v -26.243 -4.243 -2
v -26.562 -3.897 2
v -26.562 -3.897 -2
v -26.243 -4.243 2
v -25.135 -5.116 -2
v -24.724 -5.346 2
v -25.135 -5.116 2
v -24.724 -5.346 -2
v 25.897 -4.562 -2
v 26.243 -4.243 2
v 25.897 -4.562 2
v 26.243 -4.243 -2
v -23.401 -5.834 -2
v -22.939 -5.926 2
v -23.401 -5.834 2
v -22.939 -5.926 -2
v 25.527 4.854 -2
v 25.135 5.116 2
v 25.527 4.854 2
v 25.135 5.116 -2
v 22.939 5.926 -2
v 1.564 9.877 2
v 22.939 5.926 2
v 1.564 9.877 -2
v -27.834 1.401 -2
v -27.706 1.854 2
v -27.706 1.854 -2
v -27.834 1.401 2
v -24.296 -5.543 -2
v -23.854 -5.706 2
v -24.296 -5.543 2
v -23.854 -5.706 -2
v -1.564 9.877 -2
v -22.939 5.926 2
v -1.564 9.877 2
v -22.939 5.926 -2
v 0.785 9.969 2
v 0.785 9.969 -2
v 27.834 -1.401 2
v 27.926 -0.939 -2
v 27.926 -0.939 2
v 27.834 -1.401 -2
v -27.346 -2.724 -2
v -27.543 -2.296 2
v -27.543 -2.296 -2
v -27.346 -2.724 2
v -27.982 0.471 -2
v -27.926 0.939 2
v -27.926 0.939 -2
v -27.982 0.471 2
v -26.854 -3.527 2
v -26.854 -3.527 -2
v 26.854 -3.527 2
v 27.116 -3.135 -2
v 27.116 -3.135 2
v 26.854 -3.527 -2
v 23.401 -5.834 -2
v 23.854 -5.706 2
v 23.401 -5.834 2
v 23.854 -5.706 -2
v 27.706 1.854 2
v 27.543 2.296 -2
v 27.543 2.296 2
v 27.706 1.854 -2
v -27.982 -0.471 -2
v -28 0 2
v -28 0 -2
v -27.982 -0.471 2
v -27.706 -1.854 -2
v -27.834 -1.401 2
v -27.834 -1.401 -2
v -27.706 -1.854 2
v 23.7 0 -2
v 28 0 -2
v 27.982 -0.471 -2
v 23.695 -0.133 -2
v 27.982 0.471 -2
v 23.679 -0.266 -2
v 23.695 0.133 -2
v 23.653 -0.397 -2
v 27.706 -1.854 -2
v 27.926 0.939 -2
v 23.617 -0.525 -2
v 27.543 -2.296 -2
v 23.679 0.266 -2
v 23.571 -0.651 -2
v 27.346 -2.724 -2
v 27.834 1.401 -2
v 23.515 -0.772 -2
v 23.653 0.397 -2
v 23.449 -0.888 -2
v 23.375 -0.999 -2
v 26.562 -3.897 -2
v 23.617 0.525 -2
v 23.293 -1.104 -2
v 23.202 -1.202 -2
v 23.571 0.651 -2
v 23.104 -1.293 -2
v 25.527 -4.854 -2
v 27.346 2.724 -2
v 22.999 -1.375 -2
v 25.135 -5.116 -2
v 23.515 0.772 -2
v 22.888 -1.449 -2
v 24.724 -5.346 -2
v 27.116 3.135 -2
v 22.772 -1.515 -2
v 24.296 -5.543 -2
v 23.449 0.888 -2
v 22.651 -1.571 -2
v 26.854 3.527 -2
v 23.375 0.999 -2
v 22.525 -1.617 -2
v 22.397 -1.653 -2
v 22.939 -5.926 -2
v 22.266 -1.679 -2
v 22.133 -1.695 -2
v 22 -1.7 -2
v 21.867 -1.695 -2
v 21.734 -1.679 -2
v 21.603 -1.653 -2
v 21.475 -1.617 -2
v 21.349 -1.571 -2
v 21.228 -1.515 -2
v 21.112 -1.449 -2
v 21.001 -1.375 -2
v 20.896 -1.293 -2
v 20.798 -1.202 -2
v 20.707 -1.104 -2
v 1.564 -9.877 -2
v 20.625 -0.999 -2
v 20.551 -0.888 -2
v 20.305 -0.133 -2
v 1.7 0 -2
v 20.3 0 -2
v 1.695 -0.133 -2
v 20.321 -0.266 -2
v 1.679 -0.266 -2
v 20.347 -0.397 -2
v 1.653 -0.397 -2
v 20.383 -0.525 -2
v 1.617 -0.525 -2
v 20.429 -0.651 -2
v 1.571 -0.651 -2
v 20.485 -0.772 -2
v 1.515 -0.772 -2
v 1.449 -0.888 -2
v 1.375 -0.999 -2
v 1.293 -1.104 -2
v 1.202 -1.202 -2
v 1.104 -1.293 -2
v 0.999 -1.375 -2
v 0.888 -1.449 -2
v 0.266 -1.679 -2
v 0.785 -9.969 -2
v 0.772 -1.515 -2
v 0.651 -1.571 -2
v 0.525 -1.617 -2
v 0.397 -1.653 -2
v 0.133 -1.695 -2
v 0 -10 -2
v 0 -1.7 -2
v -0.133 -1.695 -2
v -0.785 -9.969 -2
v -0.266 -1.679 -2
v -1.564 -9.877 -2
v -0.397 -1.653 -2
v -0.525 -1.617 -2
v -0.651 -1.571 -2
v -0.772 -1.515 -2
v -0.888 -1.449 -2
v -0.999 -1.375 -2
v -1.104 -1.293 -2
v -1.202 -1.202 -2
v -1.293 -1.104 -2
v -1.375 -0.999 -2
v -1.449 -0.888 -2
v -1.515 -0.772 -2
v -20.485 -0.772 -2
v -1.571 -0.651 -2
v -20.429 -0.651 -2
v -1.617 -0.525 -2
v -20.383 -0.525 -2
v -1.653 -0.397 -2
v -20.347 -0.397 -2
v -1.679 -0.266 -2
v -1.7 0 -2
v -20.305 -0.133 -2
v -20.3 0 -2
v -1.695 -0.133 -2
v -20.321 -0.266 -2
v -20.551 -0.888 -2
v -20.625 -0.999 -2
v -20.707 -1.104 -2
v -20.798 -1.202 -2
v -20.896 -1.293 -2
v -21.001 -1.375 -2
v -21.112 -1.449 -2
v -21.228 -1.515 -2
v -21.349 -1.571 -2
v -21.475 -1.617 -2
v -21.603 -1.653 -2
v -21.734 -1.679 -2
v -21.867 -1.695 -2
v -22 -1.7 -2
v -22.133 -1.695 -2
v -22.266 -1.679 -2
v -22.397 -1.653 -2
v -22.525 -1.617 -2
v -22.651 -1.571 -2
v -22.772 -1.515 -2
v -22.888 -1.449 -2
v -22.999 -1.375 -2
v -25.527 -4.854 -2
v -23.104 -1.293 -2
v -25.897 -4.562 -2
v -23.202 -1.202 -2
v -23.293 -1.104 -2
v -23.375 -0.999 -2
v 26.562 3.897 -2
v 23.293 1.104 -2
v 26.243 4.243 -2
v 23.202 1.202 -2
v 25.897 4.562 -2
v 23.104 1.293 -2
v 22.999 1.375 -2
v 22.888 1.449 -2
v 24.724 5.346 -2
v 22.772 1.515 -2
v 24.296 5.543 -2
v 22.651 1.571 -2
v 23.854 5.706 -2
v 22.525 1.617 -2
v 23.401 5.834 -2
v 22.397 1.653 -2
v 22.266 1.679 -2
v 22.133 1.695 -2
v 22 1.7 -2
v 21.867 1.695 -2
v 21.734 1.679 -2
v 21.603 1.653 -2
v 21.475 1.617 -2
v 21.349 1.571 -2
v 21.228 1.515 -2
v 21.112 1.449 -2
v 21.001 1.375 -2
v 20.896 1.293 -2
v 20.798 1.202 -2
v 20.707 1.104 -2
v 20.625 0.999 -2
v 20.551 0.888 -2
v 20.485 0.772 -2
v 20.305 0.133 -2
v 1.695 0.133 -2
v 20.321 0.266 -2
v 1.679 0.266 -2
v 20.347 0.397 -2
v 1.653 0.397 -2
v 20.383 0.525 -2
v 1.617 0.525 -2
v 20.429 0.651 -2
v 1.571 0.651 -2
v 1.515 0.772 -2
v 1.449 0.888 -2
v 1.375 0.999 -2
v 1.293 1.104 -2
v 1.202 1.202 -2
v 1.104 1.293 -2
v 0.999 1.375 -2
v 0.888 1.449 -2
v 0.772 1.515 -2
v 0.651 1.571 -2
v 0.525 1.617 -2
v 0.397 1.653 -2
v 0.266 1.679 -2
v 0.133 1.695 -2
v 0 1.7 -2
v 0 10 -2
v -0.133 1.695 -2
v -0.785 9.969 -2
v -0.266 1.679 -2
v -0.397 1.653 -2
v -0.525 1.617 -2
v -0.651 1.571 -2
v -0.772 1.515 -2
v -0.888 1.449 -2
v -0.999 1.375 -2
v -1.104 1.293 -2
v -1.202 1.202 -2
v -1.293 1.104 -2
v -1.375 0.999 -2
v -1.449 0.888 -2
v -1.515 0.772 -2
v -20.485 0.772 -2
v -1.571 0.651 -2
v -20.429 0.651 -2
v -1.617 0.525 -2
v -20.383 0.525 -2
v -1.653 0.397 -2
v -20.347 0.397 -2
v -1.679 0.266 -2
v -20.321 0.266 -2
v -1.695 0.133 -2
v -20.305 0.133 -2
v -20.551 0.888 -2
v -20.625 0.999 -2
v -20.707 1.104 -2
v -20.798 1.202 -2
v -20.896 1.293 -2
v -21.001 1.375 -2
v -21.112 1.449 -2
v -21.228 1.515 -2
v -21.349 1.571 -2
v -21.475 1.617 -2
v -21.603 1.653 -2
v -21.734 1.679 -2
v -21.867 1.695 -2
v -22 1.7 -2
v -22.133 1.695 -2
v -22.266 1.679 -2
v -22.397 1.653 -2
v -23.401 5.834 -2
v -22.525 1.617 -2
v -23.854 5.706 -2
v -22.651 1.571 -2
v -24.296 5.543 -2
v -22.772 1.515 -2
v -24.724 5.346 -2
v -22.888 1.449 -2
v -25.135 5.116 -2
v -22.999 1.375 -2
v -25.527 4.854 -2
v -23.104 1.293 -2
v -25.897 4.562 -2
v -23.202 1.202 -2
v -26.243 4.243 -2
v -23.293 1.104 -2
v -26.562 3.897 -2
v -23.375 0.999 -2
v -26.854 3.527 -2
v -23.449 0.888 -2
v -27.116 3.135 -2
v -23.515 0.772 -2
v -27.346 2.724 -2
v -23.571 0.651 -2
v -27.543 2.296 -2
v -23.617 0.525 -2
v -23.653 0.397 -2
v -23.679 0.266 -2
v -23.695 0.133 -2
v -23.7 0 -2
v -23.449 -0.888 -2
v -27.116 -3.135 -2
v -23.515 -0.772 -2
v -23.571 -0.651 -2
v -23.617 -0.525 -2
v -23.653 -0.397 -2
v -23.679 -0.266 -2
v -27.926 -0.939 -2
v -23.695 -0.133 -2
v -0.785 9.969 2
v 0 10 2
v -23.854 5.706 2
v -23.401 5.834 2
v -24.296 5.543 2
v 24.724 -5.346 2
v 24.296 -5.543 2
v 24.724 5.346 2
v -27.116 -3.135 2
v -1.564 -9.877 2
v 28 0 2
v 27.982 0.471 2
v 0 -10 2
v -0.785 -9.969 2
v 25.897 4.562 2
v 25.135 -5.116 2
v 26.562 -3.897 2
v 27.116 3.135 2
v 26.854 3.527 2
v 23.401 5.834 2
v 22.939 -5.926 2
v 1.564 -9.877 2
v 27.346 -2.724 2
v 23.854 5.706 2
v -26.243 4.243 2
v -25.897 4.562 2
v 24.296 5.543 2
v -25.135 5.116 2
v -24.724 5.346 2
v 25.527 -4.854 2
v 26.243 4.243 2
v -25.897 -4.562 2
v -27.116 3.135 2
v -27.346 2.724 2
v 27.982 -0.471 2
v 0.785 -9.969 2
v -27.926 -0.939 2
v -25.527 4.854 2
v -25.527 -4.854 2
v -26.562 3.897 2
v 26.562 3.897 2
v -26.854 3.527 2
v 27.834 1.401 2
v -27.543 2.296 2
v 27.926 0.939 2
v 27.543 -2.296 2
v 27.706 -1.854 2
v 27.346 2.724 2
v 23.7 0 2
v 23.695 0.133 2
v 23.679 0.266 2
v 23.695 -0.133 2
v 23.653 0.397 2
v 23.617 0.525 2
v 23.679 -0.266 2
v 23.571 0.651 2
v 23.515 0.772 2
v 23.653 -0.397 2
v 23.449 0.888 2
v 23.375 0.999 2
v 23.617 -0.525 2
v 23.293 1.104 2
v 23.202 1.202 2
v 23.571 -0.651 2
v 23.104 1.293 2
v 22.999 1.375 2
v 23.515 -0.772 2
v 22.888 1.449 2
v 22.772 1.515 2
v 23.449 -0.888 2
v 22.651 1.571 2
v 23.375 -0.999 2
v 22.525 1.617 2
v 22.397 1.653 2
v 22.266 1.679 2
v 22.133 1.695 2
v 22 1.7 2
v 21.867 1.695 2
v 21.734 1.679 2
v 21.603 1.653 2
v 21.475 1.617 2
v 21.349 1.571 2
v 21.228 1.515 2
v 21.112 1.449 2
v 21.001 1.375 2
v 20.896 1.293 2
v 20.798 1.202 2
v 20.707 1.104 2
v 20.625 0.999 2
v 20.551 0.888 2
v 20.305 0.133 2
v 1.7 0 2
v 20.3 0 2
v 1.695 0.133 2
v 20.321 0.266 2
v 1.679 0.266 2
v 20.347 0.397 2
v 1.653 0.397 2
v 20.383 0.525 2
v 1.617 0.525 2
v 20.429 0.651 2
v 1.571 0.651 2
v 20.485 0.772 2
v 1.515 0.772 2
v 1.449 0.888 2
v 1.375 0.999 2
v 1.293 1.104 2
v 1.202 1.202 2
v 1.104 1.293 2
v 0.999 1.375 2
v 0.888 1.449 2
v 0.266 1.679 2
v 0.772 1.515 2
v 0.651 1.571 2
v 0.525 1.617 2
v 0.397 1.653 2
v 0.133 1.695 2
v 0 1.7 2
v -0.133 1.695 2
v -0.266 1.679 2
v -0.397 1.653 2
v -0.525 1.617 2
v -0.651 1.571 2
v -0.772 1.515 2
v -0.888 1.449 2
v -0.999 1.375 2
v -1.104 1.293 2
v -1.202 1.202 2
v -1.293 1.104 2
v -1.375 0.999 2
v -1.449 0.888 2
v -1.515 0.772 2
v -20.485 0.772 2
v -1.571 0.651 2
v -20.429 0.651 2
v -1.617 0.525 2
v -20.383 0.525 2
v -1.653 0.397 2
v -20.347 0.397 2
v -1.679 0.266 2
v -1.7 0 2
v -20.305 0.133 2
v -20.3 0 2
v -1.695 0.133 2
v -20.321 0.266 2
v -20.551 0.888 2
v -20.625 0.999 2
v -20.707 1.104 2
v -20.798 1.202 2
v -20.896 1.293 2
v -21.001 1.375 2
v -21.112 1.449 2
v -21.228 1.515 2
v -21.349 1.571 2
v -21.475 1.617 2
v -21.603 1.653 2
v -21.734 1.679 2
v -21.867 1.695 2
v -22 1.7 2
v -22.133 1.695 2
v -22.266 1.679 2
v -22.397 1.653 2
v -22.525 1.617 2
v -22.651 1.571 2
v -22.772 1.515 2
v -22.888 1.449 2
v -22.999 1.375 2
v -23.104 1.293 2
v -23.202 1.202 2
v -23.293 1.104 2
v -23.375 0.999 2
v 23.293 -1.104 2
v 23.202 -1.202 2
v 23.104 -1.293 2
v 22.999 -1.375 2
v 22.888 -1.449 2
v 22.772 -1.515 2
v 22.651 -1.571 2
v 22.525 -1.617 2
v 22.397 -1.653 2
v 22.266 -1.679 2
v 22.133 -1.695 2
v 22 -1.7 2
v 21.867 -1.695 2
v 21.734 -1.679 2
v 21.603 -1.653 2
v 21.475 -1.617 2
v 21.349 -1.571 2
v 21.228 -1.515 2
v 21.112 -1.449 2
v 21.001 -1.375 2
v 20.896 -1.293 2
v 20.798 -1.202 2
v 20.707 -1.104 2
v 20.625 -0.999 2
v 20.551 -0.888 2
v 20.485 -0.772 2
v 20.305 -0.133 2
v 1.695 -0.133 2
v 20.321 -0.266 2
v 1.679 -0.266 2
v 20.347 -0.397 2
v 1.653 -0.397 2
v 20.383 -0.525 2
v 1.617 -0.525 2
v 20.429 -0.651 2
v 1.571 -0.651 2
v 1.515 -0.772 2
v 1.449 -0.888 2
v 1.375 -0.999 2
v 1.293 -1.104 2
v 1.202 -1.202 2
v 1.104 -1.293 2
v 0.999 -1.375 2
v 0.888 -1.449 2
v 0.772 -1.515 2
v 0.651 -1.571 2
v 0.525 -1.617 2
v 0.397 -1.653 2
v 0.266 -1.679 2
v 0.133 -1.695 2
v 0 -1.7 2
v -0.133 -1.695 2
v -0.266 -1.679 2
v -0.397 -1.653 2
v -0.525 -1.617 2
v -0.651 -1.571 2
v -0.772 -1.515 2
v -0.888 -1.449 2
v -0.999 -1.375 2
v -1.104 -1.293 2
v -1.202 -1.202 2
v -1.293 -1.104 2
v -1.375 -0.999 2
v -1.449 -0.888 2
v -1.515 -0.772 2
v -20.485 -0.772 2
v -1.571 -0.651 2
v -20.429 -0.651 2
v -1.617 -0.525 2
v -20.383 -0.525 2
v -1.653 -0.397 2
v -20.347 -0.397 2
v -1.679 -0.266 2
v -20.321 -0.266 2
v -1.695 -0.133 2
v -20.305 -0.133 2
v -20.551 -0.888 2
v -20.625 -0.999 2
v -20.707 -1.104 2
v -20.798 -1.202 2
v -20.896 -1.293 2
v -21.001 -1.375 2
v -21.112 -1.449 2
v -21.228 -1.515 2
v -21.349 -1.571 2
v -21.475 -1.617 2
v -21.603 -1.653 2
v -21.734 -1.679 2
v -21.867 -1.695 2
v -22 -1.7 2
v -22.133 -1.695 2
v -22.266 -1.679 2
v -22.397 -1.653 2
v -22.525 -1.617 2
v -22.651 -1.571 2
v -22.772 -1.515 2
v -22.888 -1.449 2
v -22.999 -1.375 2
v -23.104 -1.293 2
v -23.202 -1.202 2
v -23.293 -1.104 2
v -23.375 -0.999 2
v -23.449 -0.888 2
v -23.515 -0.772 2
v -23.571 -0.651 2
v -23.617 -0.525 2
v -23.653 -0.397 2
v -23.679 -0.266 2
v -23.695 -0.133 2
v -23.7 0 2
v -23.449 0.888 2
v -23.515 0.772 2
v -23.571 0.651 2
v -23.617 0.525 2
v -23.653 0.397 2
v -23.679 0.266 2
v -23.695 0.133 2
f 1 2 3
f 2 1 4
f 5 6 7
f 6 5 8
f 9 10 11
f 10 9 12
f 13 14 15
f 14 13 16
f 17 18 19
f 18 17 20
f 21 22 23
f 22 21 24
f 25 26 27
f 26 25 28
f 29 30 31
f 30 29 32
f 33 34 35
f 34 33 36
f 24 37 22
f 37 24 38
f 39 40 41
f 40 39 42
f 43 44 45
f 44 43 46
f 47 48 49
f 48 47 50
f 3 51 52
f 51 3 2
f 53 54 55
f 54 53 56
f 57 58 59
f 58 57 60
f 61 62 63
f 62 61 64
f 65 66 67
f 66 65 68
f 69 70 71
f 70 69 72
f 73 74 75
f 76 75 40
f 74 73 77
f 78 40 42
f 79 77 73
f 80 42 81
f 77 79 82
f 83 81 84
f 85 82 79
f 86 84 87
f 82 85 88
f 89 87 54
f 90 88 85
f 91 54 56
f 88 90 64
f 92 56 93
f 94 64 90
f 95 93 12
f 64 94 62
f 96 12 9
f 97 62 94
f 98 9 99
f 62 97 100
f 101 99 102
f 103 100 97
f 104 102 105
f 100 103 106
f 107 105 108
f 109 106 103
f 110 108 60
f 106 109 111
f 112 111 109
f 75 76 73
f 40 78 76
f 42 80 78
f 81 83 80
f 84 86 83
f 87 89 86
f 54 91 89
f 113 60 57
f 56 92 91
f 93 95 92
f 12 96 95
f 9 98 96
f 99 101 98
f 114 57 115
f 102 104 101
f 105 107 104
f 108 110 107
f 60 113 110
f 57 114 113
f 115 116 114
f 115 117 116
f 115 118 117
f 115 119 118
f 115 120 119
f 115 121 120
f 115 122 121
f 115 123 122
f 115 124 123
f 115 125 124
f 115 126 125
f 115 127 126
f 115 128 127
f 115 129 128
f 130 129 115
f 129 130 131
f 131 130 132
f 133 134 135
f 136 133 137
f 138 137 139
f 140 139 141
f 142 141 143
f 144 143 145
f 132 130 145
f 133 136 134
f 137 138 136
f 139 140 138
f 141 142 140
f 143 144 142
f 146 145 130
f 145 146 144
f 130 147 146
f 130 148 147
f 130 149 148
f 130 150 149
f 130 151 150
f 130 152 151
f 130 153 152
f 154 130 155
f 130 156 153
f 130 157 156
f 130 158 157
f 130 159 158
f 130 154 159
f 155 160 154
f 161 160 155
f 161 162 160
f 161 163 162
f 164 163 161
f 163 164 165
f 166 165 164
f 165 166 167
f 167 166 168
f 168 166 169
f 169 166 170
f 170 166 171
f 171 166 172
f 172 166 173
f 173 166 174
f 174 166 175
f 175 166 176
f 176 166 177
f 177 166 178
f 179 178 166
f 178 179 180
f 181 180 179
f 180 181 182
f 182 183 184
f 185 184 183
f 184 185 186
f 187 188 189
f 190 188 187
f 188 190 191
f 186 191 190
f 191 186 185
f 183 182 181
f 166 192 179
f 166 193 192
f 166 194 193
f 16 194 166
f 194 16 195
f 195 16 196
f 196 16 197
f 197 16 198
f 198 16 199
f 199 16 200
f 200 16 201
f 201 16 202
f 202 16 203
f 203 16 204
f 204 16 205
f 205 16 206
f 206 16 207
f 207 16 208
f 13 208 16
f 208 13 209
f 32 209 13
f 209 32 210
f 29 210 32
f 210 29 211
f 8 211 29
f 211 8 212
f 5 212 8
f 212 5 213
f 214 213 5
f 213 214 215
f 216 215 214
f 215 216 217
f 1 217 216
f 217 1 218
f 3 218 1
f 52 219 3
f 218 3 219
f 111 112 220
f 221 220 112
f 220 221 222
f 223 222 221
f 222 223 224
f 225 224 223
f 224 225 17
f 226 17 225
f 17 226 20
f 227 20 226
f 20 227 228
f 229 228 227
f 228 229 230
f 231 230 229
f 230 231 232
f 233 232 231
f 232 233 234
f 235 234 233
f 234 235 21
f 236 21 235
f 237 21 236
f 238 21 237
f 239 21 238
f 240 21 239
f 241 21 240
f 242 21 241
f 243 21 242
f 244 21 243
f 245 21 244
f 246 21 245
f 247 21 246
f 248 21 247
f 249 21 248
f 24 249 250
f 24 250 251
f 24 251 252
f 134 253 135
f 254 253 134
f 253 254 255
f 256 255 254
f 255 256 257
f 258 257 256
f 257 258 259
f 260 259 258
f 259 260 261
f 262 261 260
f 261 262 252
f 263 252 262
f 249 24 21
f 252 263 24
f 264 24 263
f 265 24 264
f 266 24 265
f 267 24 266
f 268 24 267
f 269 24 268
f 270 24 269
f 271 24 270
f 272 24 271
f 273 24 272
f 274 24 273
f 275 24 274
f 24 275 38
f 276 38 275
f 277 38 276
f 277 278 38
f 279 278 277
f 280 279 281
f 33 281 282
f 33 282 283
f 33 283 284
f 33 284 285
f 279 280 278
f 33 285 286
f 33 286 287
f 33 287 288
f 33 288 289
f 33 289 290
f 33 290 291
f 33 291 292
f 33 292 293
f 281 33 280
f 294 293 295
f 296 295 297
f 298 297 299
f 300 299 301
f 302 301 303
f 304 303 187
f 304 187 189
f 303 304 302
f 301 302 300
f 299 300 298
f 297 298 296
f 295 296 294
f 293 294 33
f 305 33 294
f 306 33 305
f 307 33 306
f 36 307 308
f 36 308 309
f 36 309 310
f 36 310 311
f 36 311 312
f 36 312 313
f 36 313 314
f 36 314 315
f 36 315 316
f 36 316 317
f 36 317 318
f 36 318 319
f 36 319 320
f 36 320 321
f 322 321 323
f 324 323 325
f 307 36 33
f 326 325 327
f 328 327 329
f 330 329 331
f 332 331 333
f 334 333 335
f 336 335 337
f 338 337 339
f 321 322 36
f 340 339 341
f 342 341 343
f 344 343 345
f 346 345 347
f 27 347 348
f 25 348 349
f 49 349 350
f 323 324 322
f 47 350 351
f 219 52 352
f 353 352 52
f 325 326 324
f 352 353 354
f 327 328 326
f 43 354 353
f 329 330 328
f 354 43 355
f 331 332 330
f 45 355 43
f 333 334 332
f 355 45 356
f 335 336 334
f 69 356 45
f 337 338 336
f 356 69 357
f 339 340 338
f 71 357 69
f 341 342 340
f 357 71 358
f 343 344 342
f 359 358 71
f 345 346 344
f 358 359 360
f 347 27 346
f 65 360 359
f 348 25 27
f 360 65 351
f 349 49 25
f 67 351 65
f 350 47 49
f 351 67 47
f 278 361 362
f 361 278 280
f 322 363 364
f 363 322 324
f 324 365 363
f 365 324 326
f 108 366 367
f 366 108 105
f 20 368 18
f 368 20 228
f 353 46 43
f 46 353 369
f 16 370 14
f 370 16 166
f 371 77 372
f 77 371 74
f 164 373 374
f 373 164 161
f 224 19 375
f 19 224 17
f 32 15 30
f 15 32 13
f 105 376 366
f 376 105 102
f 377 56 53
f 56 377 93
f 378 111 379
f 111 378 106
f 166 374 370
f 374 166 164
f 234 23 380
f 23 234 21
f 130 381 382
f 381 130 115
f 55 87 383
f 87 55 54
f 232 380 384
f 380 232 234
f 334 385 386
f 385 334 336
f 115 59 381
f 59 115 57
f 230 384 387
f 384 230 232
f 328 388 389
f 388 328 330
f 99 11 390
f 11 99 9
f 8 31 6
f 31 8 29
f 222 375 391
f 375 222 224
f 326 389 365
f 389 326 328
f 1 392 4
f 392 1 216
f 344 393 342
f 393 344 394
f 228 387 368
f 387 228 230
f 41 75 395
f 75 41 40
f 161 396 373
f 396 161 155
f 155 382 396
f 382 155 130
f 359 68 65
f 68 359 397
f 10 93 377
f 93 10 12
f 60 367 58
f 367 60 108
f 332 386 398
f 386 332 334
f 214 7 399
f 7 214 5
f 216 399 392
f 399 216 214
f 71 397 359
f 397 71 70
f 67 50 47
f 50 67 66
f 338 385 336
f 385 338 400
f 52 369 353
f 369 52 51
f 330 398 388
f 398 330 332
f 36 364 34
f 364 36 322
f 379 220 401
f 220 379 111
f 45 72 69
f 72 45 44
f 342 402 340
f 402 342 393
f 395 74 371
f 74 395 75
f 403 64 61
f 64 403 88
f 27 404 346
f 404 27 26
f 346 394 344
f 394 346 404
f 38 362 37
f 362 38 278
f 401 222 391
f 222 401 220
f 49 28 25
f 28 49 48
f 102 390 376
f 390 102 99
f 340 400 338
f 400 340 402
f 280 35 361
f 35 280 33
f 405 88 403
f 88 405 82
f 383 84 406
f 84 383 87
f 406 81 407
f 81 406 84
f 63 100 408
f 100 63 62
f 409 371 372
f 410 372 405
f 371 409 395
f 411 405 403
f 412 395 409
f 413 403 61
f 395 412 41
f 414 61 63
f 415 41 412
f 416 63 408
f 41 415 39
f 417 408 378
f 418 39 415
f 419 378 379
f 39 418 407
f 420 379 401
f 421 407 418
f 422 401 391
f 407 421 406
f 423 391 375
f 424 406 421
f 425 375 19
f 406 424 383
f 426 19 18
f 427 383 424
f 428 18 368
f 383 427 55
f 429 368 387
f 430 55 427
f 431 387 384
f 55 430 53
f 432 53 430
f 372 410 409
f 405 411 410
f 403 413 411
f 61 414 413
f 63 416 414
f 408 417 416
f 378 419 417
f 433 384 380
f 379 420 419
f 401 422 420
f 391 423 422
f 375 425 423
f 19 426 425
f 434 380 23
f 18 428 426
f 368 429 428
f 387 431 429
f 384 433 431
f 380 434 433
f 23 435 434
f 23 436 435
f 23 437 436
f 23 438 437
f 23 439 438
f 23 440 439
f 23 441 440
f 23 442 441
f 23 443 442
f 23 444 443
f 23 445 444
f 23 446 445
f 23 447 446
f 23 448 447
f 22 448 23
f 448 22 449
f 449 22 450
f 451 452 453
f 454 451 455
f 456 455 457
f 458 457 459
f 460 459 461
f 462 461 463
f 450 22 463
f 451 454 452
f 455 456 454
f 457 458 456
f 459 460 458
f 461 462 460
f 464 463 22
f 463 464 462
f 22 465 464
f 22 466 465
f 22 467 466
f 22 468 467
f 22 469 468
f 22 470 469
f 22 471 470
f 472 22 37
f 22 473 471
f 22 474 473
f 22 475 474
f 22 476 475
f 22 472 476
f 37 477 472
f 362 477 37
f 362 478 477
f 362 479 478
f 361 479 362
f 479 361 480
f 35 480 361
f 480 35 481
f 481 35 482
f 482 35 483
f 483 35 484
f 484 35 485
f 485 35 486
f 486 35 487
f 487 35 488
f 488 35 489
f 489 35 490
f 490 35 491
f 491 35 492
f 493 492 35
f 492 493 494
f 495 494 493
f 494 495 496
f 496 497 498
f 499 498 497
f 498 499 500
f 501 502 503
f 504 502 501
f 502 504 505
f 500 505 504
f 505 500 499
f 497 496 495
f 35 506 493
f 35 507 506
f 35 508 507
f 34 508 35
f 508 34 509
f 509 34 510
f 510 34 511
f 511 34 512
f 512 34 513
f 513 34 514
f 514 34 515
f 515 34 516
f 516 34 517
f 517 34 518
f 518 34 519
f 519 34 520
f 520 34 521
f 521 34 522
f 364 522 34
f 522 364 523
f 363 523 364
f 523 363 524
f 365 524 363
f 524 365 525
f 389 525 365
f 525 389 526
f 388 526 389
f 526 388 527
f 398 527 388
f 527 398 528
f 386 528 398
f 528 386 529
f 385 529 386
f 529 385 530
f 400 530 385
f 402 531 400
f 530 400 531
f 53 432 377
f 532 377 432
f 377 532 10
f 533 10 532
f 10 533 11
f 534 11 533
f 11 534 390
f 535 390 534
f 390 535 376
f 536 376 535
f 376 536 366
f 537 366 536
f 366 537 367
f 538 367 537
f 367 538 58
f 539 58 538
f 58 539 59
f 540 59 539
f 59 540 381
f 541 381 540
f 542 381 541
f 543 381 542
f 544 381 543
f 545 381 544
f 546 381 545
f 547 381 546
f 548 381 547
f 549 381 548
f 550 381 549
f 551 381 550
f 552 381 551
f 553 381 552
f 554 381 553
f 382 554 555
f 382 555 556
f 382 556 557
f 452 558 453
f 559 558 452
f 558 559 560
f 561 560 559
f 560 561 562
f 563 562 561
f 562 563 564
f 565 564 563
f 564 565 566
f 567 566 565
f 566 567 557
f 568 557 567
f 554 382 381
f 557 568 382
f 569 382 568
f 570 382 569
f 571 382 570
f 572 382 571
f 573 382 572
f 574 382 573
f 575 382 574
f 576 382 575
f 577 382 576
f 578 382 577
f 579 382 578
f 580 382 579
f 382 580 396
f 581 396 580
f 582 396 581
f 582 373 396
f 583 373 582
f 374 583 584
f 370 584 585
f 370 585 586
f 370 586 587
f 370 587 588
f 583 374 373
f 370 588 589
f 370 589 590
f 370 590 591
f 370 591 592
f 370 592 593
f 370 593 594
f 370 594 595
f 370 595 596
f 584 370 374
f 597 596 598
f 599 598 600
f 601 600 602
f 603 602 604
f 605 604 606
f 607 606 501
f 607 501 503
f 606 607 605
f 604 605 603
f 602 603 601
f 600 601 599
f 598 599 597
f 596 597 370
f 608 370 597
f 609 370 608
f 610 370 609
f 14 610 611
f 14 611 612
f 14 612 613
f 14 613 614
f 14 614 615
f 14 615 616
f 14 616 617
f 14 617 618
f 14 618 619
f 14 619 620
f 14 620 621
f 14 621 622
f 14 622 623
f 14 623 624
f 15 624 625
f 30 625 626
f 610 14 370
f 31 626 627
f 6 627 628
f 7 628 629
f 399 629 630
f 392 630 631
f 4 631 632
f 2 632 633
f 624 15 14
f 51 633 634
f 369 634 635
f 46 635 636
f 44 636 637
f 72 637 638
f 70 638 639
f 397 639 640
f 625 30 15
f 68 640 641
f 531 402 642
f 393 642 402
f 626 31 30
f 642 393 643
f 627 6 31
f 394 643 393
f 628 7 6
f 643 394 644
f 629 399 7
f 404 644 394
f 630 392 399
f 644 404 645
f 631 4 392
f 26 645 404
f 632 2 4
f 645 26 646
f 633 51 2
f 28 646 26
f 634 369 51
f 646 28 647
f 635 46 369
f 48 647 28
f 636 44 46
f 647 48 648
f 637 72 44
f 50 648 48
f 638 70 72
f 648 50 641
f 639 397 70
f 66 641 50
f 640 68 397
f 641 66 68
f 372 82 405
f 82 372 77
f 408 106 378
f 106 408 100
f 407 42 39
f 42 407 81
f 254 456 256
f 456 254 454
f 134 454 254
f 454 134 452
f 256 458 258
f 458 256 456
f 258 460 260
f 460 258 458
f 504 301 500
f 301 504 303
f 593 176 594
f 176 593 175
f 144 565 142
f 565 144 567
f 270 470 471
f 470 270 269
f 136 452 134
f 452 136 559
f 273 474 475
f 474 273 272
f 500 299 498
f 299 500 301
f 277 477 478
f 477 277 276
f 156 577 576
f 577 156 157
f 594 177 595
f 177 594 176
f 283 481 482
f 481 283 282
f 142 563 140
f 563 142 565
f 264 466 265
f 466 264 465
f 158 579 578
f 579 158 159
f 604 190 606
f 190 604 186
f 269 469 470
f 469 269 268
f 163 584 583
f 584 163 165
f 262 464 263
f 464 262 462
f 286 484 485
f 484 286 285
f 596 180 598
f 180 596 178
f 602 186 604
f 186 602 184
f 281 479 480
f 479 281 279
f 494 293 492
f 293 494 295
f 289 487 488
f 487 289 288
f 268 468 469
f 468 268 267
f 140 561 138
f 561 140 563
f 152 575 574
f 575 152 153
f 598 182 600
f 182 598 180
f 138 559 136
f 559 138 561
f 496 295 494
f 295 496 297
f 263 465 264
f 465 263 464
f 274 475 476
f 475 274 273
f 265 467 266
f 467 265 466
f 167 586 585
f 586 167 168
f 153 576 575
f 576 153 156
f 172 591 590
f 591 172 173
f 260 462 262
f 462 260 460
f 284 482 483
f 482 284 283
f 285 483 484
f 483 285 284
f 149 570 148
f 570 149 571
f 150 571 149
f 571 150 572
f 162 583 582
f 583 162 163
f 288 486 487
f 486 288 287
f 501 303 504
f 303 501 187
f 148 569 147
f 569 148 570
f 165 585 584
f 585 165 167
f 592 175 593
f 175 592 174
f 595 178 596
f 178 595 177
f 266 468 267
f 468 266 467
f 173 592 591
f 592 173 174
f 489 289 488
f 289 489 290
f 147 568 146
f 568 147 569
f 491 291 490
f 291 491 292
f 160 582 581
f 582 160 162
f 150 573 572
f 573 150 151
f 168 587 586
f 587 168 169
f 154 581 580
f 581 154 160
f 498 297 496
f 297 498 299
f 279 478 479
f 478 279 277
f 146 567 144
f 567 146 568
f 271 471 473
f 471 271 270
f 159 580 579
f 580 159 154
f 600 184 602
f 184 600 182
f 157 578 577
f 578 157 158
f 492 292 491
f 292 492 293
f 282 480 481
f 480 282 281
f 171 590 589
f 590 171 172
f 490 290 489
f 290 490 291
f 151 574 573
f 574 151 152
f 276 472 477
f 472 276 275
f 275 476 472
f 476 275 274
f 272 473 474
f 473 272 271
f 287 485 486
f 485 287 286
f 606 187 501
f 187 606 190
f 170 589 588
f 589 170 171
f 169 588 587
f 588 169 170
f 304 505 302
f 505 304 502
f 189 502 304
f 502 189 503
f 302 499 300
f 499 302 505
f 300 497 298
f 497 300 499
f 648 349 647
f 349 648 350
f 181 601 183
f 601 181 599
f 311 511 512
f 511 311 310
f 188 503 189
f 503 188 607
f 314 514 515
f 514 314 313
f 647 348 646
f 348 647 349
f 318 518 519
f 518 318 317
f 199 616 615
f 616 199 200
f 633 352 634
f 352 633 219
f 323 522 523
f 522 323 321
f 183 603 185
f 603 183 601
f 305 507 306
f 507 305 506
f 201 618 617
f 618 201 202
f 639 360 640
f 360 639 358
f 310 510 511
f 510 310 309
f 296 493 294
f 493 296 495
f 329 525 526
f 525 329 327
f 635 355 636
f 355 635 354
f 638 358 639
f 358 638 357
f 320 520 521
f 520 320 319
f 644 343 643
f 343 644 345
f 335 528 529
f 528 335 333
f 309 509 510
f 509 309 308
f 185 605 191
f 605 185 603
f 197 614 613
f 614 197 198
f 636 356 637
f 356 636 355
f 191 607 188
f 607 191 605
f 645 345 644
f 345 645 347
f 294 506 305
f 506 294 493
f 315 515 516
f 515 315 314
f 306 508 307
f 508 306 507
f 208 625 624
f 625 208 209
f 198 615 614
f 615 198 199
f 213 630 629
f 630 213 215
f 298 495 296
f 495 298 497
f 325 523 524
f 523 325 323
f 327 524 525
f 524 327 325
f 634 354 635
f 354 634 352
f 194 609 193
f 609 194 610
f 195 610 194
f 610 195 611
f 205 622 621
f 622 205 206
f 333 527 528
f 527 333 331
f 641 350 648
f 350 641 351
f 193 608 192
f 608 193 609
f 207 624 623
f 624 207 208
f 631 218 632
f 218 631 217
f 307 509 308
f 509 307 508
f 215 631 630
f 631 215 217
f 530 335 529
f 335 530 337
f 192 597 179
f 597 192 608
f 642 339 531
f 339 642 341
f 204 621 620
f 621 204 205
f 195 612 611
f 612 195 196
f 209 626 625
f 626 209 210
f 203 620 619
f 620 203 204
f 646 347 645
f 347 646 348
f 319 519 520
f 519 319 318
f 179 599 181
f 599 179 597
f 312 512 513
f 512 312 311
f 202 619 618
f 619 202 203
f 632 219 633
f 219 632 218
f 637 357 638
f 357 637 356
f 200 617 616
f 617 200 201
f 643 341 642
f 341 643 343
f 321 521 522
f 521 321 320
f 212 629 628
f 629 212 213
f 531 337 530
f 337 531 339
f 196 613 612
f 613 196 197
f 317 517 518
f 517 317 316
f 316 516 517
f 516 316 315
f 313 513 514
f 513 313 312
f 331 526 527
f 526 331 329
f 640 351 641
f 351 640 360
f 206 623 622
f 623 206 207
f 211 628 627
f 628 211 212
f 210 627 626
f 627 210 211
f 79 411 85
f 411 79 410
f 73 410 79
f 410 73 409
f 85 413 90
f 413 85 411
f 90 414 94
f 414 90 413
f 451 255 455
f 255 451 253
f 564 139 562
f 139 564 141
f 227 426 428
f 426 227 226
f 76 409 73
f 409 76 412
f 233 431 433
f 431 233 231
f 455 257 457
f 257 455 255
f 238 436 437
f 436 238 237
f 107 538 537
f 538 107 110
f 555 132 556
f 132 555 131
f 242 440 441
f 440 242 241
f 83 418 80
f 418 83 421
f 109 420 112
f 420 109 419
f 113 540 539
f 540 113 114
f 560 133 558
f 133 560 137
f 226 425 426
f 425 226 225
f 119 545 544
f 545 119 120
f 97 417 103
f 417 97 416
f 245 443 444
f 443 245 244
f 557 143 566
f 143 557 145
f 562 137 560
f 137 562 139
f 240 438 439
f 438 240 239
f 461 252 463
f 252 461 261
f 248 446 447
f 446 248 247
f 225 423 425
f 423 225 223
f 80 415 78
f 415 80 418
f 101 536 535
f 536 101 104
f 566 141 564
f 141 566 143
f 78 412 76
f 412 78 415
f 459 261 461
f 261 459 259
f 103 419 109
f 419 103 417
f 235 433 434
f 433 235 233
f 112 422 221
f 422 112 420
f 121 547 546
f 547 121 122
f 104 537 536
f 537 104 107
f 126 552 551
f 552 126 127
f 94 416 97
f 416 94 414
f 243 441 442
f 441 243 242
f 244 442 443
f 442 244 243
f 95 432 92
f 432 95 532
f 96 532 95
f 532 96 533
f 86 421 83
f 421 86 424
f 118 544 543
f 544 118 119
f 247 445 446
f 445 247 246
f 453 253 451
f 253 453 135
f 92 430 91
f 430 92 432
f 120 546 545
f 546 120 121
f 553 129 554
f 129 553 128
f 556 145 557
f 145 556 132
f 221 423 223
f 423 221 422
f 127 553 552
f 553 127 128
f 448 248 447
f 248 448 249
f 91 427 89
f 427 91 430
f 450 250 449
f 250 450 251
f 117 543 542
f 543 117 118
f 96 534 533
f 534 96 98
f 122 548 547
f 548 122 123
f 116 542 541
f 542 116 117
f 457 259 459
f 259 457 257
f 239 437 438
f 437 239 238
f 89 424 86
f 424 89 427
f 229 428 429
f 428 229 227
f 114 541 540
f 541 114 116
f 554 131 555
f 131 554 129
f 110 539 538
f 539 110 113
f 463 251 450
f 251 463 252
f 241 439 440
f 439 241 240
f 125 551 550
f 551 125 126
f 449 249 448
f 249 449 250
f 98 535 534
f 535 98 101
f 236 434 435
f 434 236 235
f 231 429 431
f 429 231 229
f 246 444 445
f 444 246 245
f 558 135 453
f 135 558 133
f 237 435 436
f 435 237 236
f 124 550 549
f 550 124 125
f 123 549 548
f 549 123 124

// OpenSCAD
// =====================================================================
//  CHI TIẾT: THANH ĐÒN HÌNH THOI BO GÓC (KẾT NỐI SERVO VÀ 2 DẦM)
//  Kiểu dáng: Hình thoi vuốt thon bo tròn 2 đầu (tối ưu cơ học & gọn nhẹ)
//  Kích thước: Dài 56mm, rộng giữa 20mm, rộng 2 đầu 12mm, dày 5mm
//  Lỗ vít: 1 lỗ tâm M3 + 2 lỗ M3 ở 2 đầu cách nhau 44mm
//  Phần mềm: OpenSCAD
// =====================================================================

// Khoảng cách giữa 2 lỗ bắt dầm (khớp chuẩn 44mm trên tấm lá chớp)
HOLE_SPAN = 44;   

// Độ dày thanh đòn
THICKNESS = 4;    

// Bề rộng ở phần tâm (chỗ trục servo chịu lực xoắn lớn nhất)
CENTER_W  = 20;   

// Bề rộng ở 2 đầu mút (ôm vừa lỗ ốc M3)
END_W     = 12;   

// Đường kính các lỗ vít M3 (3.4mm để luồn vừa ốc M3 trơn tru)
HOLE_D    = 3.4;  

// Độ mịn đường cong bo tròn
$fn = 80;

module diamond_servo_lever() {
    color([0.2, 0.6, 0.85]) // Màu xanh dương kỹ thuật
    difference() {
        // --- 1. THÂN THANH ĐÒN HÌNH THOI BO TRÒN ---
        // Dùng hull nối khối trụ tâm và 2 khối trụ ở 2 đầu
        hull() {
            // Khối tròn ở tâm (rộng 20mm)
            translate([0, 0, -THICKNESS/2])
                cylinder(d = CENTER_W, h = THICKNESS);

            // Đầu mút bên trái (rộng 12mm, tâm lỗ tại X = -22mm)
            translate([-HOLE_SPAN/2, 0, -THICKNESS/2])
                cylinder(d = END_W, h = THICKNESS);

            // Đầu mút bên phải (rộng 12mm, tâm lỗ tại X = +22mm)
            translate([HOLE_SPAN/2, 0, -THICKNESS/2])
                cylinder(d = END_W, h = THICKNESS);
        }

        // --- 2. BA LỖ BẮT VÍT M3 ---
        // Lỗ tròn ở tâm: bắt trục / ốc servo
        translate([0, 0, -THICKNESS/2 - 1])
            cylinder(d = HOLE_D, h = THICKNESS + 2);

        // Lỗ bắt dầm 1: tại X = -22mm
        translate([-HOLE_SPAN/2, 0, -THICKNESS/2 - 1])
            cylinder(d = HOLE_D, h = THICKNESS + 2);

        // Lỗ bắt dầm 2: tại X = +22mm
        translate([HOLE_SPAN/2, 0, -THICKNESS/2 - 1])
            cylinder(d = HOLE_D, h = THICKNESS + 2);
    }
}

// Hiển thị chi tiết
diamond_servo_lever();
